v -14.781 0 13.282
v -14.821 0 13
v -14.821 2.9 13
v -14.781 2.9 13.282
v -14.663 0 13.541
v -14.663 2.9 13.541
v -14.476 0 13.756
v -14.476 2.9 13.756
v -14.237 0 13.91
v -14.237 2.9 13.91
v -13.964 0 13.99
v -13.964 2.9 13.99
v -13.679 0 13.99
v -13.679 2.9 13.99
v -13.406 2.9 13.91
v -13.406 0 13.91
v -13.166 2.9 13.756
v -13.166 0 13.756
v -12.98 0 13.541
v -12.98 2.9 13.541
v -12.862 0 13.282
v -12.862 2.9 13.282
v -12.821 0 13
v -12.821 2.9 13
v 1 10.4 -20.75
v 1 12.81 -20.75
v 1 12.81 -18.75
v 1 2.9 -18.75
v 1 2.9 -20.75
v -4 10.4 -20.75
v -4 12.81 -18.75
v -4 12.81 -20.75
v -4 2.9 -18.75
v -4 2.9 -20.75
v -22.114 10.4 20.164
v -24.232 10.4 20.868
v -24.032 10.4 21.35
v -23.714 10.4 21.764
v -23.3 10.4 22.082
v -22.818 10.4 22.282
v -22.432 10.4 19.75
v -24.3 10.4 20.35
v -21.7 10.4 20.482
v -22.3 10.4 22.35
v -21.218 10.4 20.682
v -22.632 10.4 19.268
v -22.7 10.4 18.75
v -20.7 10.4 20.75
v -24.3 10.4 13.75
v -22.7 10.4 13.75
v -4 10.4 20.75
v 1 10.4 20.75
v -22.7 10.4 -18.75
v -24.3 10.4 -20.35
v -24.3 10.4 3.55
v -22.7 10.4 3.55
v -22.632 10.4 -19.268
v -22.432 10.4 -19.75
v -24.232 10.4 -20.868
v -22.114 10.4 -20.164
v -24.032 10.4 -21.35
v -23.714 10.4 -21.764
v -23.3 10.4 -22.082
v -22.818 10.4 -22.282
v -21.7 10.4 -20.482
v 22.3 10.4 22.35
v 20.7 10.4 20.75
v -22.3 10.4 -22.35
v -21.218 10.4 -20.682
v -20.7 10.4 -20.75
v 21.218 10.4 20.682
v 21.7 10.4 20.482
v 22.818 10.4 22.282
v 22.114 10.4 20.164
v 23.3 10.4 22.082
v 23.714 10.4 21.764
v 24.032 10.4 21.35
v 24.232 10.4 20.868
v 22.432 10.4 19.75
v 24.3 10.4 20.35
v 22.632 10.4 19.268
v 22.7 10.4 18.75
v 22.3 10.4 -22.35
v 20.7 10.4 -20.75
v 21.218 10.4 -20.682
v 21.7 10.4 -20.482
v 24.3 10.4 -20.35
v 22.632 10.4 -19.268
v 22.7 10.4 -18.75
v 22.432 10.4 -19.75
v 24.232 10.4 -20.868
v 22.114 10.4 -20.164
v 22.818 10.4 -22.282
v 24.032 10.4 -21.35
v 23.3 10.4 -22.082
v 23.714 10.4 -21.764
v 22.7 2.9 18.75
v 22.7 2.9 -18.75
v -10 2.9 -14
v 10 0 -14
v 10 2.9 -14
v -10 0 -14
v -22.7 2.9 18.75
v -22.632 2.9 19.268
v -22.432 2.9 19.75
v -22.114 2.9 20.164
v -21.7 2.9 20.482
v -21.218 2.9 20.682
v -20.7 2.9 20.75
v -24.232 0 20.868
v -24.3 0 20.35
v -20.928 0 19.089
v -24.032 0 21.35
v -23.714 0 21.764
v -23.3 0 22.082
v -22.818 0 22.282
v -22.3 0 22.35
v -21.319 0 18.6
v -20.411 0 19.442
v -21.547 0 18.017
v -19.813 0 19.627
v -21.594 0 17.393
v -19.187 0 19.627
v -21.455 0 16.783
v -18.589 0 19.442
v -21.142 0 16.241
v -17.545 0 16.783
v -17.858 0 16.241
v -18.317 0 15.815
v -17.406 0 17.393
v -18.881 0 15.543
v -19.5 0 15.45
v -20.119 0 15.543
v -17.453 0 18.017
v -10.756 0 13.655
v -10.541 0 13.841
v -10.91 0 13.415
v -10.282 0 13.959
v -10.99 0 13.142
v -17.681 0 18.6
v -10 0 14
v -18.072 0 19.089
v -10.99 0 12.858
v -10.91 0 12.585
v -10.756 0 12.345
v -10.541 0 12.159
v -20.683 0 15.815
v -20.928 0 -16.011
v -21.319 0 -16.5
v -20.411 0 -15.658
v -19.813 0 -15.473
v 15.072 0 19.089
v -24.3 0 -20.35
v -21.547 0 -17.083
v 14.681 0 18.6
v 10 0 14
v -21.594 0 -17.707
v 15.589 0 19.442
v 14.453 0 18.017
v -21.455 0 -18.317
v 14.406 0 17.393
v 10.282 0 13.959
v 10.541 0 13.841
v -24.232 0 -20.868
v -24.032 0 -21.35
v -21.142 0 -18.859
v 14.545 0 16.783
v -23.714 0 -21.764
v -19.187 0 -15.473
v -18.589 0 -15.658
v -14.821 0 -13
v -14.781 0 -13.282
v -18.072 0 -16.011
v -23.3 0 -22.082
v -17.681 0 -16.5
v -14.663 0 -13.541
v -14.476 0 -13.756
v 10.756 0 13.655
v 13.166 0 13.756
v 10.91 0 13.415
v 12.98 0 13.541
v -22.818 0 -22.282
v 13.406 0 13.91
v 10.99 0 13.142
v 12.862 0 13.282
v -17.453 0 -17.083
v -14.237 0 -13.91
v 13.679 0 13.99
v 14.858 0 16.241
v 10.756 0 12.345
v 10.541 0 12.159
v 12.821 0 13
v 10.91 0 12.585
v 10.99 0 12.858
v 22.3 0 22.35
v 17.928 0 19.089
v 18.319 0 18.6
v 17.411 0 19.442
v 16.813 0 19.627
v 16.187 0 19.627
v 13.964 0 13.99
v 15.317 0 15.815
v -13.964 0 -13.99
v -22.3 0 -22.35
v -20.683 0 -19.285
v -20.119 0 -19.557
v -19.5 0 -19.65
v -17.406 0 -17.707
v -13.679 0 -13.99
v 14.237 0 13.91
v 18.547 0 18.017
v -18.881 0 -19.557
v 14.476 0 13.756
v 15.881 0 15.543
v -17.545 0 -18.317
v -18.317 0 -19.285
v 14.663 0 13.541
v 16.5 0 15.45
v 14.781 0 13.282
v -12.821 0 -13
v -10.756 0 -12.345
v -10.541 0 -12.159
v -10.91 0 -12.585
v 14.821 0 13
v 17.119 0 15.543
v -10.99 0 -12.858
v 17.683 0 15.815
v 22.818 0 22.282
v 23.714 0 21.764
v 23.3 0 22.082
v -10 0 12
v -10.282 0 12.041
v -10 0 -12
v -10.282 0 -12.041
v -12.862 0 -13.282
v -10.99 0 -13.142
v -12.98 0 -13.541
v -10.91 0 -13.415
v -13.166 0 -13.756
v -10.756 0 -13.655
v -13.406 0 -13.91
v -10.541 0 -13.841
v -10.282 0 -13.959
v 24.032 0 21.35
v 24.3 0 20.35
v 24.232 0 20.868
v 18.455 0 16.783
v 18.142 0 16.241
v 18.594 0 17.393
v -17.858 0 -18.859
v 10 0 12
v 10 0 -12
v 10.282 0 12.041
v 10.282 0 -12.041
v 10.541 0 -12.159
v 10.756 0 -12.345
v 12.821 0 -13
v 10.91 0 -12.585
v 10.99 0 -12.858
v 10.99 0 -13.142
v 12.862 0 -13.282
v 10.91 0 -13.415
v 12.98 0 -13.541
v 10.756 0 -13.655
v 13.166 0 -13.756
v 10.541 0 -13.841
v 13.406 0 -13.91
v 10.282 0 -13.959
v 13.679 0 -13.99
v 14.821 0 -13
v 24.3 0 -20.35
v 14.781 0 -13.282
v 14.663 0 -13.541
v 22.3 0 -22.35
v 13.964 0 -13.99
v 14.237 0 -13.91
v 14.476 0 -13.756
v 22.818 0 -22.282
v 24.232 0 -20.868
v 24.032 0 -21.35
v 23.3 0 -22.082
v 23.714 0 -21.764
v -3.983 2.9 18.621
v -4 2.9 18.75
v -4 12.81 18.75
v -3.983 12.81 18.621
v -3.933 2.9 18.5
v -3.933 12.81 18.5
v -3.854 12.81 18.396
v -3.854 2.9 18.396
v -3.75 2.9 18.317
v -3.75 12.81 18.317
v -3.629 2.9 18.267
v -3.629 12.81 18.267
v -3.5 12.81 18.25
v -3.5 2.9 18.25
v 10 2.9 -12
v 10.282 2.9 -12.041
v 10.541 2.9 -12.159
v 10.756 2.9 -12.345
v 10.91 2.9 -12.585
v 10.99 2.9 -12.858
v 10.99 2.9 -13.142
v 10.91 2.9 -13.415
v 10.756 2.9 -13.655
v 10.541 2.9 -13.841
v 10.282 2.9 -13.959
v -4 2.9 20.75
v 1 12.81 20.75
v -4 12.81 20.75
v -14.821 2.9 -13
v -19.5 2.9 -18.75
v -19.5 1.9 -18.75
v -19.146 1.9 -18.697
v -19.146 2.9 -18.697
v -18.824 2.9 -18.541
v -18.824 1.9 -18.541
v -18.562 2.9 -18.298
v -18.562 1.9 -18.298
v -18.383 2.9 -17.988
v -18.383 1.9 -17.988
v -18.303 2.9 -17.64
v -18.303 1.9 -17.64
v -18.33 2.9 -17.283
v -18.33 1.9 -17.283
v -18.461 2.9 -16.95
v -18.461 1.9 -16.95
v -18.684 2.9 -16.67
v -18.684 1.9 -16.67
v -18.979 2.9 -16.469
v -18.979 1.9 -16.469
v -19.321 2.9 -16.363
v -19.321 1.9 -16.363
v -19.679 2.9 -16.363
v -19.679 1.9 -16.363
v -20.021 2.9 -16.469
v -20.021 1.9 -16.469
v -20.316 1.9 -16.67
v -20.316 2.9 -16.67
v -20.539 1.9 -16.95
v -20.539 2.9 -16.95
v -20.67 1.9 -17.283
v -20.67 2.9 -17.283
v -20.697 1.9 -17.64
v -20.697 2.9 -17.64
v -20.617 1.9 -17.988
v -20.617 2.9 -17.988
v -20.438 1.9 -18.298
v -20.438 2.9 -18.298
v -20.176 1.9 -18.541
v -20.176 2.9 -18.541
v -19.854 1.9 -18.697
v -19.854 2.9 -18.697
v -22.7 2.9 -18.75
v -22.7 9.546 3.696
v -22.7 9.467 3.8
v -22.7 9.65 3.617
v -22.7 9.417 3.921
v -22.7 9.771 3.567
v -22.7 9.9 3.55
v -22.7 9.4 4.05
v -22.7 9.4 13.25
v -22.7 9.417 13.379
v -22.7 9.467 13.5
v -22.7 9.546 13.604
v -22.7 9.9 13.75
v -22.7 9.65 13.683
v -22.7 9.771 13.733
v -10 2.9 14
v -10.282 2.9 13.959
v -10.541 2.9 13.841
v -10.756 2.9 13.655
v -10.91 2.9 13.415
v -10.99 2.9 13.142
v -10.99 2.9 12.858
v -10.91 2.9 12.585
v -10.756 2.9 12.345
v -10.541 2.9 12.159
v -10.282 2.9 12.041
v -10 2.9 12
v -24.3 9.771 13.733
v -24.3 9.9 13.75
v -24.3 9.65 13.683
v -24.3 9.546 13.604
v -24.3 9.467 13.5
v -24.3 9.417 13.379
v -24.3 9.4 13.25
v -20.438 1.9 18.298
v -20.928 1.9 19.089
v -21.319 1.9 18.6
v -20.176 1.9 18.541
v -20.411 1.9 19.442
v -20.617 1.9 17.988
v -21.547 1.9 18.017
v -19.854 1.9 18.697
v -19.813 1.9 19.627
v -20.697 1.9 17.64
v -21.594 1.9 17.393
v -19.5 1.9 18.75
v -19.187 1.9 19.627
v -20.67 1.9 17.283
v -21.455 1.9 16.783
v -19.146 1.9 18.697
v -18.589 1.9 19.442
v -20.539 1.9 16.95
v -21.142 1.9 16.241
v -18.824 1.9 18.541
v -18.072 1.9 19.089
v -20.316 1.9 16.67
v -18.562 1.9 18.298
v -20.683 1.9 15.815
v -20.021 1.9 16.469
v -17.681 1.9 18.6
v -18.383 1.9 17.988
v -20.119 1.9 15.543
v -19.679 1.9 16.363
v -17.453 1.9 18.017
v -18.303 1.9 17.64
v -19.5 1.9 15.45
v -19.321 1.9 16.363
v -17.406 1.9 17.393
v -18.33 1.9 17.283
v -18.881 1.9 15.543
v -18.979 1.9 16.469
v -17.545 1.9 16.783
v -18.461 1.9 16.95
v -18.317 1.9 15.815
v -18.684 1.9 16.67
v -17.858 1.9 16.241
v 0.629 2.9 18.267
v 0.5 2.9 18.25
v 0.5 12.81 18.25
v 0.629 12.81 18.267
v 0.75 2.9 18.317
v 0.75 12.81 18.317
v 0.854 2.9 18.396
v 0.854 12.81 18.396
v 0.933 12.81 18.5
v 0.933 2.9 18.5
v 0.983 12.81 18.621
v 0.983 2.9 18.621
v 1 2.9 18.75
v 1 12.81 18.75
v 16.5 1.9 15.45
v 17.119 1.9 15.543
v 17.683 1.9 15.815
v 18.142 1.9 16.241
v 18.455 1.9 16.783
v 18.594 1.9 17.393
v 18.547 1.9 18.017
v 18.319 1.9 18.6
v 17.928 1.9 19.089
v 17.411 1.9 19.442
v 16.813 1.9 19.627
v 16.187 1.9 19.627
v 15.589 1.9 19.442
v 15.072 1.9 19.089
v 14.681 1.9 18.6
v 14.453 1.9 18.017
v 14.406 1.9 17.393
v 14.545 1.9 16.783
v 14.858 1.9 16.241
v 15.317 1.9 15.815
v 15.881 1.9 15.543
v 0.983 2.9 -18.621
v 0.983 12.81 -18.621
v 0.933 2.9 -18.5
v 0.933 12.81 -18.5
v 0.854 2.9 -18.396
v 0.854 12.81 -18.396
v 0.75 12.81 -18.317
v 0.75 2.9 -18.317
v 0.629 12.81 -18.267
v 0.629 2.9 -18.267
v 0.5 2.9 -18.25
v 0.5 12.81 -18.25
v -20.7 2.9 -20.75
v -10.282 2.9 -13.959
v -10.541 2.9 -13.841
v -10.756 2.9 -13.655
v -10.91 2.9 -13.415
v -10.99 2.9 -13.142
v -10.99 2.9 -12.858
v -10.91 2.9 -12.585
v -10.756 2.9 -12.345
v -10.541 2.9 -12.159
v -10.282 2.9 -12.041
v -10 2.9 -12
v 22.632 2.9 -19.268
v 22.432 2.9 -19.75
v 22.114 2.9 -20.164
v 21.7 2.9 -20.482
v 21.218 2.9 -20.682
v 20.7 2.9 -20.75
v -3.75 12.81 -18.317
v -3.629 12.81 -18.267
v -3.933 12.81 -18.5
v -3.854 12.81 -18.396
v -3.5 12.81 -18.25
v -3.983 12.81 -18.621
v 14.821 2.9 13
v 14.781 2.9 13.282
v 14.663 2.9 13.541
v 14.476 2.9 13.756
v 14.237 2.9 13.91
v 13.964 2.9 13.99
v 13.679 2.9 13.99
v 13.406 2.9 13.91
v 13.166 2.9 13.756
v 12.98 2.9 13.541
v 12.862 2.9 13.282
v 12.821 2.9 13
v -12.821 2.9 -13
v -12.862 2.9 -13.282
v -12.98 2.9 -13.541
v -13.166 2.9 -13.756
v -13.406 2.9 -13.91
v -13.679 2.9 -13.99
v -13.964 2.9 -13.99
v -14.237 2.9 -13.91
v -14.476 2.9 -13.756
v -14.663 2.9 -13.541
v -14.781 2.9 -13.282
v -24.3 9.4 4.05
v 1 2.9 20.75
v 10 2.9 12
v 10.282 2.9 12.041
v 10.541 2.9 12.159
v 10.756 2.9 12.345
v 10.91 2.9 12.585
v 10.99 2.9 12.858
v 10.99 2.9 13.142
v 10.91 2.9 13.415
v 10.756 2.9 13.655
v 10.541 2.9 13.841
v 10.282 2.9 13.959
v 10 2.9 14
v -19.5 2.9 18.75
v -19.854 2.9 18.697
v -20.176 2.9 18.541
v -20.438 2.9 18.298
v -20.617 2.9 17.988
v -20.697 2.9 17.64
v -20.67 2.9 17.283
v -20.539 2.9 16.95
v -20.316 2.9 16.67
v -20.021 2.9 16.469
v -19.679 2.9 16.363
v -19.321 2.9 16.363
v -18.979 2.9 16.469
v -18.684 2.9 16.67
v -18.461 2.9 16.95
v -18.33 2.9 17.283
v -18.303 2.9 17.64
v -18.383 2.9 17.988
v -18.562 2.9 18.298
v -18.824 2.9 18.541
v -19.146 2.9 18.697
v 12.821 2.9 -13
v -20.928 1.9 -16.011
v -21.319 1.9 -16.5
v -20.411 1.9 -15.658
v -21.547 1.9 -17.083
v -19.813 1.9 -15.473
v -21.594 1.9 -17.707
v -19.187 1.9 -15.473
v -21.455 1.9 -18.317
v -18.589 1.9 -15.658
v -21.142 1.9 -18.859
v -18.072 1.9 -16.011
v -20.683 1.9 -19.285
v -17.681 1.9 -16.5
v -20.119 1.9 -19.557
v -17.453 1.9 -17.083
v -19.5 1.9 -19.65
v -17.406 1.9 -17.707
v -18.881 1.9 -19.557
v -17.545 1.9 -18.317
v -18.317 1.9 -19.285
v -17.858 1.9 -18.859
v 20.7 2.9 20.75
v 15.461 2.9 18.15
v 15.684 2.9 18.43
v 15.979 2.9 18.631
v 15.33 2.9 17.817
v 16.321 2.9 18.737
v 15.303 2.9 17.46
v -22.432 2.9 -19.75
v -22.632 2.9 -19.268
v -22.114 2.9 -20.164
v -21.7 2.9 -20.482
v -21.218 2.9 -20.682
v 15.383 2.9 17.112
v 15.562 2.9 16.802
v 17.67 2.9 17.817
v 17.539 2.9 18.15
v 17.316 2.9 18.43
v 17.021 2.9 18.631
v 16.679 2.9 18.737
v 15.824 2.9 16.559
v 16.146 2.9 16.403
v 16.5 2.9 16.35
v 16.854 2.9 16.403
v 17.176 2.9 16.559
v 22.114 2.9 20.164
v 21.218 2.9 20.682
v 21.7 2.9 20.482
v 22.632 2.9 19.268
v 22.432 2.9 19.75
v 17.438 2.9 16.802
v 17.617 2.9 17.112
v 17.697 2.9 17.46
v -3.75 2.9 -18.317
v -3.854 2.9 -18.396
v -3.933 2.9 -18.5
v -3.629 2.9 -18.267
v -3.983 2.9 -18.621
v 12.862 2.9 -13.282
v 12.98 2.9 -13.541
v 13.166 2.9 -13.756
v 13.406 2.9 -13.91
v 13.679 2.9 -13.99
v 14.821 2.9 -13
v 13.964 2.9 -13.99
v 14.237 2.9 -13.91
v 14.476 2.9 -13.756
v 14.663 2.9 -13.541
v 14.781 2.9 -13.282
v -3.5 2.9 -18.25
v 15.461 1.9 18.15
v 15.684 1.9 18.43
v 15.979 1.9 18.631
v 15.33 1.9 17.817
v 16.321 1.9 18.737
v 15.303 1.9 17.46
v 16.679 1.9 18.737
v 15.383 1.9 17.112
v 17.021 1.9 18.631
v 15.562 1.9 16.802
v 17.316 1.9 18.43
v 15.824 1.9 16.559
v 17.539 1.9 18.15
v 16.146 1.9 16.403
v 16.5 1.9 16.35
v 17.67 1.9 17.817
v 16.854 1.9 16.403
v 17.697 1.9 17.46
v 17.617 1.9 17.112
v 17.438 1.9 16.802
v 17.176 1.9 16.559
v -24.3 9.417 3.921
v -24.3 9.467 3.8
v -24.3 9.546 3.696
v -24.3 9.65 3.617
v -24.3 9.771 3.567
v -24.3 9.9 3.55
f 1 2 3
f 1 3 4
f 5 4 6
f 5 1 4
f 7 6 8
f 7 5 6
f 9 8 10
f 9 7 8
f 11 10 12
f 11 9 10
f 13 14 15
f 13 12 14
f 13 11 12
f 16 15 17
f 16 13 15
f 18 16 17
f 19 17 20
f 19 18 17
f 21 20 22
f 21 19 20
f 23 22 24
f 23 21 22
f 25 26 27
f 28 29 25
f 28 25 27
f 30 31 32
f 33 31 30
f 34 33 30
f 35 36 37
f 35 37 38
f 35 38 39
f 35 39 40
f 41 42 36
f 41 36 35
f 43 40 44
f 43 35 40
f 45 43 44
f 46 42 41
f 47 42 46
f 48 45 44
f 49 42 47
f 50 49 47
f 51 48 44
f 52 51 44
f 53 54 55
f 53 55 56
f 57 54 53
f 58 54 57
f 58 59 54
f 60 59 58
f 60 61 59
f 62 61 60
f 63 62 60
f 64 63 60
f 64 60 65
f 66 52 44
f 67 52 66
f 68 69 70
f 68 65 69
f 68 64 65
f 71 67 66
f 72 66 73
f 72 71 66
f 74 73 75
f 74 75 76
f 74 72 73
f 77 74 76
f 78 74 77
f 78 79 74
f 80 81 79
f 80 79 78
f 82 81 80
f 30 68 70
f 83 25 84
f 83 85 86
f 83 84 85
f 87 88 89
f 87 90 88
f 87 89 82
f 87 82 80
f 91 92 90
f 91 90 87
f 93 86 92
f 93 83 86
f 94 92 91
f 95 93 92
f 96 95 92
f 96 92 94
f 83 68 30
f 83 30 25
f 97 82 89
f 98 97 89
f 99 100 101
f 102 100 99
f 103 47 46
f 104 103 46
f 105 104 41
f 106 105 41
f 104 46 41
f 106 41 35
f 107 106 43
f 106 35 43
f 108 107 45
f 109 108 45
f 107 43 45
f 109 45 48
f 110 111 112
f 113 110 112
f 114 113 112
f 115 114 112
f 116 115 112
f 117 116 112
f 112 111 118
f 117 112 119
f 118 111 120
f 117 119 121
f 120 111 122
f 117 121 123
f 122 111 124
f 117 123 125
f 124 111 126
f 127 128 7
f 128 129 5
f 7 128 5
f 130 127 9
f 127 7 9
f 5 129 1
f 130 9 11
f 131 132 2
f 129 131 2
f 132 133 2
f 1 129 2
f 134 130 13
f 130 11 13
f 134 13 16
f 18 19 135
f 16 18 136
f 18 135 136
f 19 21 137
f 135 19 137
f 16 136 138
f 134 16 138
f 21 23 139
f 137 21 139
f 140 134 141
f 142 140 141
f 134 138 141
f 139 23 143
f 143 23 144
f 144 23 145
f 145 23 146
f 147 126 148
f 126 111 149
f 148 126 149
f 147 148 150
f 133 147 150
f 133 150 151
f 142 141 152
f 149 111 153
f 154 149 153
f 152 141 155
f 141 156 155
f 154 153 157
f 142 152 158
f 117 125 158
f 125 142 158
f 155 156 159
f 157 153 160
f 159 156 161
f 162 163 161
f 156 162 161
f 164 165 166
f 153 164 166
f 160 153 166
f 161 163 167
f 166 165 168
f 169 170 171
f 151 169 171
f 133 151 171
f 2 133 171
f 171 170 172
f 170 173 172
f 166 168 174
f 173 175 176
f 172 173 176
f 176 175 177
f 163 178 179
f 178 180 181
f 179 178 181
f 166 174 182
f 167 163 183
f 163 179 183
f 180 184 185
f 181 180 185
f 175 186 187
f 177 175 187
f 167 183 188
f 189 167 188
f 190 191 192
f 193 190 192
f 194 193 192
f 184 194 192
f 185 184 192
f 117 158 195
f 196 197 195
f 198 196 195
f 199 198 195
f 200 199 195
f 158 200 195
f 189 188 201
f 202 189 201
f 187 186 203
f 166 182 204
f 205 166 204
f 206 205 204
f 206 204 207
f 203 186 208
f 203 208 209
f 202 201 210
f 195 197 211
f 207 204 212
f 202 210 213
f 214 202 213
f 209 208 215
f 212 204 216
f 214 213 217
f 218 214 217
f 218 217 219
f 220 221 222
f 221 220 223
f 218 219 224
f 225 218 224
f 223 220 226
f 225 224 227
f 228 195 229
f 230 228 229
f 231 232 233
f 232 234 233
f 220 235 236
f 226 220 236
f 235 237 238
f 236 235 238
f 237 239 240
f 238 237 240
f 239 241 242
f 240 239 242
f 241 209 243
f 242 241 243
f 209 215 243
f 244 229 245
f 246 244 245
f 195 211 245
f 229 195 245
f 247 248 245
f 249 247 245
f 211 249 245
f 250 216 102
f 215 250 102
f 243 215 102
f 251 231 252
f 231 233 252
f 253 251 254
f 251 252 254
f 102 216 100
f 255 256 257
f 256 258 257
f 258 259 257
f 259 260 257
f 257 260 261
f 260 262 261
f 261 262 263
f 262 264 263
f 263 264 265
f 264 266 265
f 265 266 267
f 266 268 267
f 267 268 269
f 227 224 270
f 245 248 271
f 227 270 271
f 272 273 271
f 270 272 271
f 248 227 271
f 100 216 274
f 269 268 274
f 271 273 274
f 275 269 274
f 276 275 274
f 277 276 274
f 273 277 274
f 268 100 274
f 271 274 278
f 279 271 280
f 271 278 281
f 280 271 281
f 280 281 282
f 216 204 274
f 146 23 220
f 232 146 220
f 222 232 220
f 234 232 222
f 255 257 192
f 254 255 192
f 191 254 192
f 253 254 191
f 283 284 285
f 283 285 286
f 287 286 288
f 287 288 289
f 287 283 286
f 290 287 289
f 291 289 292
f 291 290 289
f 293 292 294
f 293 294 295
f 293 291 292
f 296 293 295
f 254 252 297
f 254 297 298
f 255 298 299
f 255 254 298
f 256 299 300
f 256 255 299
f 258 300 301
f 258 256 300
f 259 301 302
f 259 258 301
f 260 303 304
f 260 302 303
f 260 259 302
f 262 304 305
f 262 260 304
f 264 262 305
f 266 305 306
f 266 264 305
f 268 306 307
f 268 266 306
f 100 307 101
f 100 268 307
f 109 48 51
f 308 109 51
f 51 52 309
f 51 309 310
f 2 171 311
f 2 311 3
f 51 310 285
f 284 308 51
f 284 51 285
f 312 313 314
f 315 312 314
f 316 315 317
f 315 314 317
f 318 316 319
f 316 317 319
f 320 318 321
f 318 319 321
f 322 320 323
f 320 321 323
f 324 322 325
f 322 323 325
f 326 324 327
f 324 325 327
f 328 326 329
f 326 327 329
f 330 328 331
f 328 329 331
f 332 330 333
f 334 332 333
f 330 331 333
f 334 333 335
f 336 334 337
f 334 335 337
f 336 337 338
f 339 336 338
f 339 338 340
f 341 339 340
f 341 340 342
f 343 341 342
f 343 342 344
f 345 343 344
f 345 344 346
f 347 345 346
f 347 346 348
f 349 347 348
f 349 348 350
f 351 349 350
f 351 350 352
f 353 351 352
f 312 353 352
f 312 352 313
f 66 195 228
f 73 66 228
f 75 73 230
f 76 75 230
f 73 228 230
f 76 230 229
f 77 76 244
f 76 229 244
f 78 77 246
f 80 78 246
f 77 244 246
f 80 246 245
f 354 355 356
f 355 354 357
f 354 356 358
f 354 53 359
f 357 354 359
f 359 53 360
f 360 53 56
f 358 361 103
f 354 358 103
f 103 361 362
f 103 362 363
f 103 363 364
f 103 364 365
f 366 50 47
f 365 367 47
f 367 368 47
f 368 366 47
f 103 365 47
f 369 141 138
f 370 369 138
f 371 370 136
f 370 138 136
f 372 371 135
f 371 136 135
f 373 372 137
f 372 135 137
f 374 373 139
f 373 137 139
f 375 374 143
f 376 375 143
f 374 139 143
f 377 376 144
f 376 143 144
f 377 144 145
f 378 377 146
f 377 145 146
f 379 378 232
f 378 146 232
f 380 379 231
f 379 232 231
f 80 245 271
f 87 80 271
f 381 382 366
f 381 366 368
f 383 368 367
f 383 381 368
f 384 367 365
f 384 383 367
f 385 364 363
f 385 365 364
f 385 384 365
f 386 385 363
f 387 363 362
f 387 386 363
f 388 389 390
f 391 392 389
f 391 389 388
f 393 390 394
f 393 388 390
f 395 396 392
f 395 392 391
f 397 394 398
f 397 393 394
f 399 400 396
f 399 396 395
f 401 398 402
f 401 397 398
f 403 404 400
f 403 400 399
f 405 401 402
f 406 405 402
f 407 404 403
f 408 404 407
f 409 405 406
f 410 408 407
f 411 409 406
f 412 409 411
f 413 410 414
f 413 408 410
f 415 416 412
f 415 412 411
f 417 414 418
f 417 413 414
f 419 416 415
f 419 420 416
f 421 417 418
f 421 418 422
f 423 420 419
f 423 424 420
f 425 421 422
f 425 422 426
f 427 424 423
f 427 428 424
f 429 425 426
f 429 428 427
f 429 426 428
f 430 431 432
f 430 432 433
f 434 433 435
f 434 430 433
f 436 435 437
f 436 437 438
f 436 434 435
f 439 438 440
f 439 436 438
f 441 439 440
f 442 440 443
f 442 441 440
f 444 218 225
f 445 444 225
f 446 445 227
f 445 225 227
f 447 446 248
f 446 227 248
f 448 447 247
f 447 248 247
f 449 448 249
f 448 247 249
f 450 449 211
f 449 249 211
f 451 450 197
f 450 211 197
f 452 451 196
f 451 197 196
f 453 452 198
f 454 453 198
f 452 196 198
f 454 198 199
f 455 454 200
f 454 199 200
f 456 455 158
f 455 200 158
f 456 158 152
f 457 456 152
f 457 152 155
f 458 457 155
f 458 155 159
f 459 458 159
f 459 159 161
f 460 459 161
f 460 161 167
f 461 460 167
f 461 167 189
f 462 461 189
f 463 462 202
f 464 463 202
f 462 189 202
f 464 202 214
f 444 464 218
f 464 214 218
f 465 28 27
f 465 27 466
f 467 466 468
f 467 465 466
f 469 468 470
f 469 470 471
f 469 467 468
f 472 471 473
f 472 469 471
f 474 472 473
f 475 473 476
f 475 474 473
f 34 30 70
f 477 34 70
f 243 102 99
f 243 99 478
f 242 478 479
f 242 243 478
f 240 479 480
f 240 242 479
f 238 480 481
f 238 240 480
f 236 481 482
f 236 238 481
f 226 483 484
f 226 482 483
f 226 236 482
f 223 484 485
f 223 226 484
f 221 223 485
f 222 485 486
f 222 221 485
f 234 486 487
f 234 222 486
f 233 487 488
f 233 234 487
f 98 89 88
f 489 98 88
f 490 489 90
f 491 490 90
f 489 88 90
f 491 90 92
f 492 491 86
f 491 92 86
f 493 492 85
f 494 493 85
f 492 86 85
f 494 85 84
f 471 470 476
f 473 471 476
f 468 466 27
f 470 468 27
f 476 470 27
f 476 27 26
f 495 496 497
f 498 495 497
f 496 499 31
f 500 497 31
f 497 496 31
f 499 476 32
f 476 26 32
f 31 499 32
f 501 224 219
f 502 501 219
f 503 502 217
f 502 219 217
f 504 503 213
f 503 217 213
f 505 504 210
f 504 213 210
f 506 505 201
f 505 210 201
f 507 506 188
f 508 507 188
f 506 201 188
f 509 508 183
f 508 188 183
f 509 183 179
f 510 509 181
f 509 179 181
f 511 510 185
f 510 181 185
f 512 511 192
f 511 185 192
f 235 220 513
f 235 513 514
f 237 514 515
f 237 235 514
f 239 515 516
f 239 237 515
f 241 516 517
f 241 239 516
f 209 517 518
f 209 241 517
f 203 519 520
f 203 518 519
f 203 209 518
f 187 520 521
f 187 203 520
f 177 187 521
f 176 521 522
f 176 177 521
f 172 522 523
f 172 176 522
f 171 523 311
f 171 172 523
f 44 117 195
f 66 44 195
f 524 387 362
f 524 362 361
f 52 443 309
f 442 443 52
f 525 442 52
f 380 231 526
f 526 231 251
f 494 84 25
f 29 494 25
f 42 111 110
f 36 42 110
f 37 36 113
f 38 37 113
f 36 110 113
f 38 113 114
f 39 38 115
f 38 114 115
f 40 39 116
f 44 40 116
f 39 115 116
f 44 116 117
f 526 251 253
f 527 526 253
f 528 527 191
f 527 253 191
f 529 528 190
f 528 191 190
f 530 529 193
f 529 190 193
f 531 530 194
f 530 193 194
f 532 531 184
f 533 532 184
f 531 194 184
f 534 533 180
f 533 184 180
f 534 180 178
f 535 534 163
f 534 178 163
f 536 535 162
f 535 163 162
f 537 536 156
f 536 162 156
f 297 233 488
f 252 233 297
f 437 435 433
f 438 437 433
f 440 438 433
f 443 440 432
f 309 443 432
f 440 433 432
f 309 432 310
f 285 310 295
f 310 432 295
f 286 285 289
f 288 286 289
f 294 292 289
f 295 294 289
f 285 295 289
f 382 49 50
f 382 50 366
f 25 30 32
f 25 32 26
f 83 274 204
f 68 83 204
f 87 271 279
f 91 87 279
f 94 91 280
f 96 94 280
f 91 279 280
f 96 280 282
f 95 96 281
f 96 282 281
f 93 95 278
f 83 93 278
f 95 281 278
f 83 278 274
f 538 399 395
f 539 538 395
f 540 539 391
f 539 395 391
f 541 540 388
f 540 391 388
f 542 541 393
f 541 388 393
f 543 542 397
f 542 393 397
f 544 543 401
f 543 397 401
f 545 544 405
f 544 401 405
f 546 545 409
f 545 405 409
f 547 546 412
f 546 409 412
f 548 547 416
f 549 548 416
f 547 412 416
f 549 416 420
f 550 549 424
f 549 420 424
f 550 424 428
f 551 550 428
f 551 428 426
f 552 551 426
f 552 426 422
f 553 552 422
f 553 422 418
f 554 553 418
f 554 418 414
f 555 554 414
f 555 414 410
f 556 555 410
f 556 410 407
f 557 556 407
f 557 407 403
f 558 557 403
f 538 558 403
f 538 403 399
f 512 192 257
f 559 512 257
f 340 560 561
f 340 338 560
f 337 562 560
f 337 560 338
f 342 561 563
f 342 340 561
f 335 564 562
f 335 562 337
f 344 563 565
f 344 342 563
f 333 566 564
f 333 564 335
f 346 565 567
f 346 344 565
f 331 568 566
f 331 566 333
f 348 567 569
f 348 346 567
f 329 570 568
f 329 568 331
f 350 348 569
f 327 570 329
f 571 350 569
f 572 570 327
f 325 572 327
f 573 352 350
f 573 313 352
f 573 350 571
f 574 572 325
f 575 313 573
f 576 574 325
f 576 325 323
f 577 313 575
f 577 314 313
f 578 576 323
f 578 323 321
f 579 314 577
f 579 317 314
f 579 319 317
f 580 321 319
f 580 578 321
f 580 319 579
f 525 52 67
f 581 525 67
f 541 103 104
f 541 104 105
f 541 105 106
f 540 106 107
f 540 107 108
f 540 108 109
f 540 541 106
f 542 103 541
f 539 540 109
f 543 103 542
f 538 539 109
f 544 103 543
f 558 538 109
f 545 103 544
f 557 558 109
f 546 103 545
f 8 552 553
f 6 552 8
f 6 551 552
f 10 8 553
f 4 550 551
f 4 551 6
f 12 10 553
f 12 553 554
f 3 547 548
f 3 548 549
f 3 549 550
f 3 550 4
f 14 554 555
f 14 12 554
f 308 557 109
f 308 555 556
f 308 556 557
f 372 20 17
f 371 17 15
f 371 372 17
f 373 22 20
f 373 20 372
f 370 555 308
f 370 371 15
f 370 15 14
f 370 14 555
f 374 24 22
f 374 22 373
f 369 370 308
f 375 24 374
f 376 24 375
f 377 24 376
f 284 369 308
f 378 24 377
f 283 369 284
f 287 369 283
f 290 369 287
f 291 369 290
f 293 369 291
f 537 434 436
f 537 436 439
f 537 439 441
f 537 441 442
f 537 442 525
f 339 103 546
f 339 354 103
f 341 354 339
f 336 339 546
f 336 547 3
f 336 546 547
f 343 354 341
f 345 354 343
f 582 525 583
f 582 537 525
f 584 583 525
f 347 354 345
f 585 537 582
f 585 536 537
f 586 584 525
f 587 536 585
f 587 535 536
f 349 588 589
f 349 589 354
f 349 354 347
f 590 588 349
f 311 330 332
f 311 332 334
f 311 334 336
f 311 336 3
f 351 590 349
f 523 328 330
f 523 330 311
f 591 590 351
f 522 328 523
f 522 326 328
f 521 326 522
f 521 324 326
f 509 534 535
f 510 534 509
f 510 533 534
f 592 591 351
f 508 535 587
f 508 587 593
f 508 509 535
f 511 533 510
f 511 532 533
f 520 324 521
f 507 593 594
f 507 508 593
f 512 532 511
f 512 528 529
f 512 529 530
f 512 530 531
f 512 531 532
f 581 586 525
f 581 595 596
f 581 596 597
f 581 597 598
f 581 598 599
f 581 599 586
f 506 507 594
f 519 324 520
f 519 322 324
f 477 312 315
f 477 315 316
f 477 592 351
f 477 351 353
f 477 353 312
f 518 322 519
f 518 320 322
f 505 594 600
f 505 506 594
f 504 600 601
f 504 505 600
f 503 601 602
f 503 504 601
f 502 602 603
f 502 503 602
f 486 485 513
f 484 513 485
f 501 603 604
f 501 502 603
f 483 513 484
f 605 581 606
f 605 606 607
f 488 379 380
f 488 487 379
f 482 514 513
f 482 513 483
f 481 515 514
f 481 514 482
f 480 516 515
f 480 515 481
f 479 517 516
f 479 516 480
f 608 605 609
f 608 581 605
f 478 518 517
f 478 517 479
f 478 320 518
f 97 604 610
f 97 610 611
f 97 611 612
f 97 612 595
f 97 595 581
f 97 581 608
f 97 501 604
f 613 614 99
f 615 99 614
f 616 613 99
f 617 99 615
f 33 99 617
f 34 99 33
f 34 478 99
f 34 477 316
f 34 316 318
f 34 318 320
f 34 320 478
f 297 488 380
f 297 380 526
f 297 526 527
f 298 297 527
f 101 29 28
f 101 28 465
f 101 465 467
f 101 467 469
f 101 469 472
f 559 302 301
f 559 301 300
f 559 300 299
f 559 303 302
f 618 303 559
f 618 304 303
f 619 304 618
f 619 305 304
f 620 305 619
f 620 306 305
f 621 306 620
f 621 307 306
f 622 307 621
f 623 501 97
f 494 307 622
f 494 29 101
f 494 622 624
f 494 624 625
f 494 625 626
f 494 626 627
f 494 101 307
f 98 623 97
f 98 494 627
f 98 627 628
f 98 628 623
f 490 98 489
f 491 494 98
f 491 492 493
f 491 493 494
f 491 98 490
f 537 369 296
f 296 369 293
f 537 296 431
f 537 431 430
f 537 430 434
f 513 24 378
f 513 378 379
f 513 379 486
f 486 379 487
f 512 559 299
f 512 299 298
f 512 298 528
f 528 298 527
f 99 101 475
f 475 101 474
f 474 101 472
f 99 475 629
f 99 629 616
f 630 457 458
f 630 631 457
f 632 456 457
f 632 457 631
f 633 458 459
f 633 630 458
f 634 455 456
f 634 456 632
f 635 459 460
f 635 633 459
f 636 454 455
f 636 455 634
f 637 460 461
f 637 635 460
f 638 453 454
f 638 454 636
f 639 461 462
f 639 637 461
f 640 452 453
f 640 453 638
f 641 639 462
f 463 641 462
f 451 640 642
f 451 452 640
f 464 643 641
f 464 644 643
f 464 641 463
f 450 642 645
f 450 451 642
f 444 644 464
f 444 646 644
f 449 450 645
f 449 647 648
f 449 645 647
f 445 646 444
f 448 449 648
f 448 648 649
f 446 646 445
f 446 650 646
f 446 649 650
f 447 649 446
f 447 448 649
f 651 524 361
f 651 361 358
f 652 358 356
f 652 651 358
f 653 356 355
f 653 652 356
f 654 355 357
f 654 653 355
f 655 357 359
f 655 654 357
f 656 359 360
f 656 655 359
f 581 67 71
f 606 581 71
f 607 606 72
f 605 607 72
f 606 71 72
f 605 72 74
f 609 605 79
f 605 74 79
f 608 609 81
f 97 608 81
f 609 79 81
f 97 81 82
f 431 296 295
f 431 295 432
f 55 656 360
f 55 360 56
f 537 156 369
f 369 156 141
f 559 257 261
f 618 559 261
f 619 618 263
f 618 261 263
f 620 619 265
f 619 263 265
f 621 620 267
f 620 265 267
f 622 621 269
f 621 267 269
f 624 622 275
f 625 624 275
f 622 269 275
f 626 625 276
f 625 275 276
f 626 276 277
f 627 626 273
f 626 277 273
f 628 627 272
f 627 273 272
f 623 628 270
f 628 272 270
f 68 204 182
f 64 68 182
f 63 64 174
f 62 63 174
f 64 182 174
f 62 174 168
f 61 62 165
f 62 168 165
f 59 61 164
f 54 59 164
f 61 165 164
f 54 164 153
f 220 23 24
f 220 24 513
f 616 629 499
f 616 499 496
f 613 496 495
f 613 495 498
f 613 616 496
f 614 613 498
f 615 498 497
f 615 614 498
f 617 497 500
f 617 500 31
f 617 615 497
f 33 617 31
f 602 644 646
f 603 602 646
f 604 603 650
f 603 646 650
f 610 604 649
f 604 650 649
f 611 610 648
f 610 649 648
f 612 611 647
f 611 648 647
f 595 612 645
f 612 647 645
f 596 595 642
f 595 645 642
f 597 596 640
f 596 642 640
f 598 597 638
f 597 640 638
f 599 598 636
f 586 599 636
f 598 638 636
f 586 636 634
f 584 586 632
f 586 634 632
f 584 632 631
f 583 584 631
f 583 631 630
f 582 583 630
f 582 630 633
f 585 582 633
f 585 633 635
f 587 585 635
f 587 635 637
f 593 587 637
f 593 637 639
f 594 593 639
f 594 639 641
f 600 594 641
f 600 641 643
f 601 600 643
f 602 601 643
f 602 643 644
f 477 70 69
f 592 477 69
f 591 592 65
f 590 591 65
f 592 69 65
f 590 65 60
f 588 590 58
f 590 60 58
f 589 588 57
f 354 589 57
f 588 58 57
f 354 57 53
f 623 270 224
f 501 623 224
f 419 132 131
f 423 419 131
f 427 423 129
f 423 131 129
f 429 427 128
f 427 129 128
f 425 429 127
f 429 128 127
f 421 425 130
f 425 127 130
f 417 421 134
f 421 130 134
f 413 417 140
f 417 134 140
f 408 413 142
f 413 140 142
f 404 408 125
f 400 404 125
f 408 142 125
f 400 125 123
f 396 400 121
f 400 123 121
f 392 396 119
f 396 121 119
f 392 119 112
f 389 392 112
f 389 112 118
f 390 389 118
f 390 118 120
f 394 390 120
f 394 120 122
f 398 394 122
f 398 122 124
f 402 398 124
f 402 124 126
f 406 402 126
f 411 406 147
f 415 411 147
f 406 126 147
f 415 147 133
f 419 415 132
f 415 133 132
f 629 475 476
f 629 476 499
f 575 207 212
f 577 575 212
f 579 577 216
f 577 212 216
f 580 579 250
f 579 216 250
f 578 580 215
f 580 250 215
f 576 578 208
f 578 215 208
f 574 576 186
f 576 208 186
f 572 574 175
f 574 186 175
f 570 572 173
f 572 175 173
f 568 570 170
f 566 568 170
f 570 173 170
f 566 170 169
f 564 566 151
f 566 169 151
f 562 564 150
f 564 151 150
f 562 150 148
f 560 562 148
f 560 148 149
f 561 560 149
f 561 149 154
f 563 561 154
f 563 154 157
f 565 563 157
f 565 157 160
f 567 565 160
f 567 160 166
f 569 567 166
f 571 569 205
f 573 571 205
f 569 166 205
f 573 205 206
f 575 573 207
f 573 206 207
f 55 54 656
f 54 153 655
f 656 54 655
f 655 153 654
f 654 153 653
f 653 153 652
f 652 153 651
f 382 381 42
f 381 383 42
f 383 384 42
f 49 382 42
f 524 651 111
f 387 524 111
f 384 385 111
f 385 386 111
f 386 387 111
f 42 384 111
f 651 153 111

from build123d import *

# Parameters (mm, degrees)
EXTRUDE_1_DEPTH     = 10.4
CUT_EXTRUDE_1_DEPTH = 7.5
SKETCH_3_R          = 2.1
CUT_EXTRUDE_2_DEPTH = 1.9
SKETCH_4_R          = 1.2
CUT_EXTRUDE_3_DEPTH = 3.2
EXTRUDE_2_DEPTH     = 9.91
CUT_EXTRUDE_4_DEPTH = 10
CUT_EXTRUDE_5_DEPTH = 10


with BuildPart() as part:
    # 草图1 → 凸台-拉伸1 (new body)
    with BuildSketch(Plane(origin=(0, 0, 0), x_dir=(1, 0, 0), z_dir=(0, 1, 0))):
        with BuildLine():
            Line((-22.3, -22.35), (22.3, -22.35))
            ThreePointArc((22.3, -22.35), (23.714213562, -21.764213562), (24.3, -20.35))
            Line((24.3, -20.35), (24.3, 20.35))
            ThreePointArc((24.3, 20.35), (23.714213562, 21.764213562), (22.3, 22.35))
            Line((22.3, 22.35), (-22.3, 22.35))
            ThreePointArc((-22.3, 22.35), (-23.714213562, 21.764213562), (-24.3, 20.35))
            Line((-24.3, 20.35), (-24.3, -20.35))
            ThreePointArc((-24.3, -20.35), (-23.714213562, -21.764213562), (-22.3, -22.35))
        make_face()
    extrude(amount=EXTRUDE_1_DEPTH)

    # 草图2 → 切除-拉伸1 (cut)
    with BuildSketch(Plane(origin=(0, 10.4, 0), x_dir=(1, 0, 0), z_dir=(0, 1, 0))):
        with BuildLine():
            Line((-20.7, -20.75), (20.7, -20.75))
            ThreePointArc((20.7, -20.75), (22.114213562, -20.164213562), (22.7, -18.75))
            Line((22.7, -18.75), (22.7, 18.75))
            ThreePointArc((22.7, 18.75), (22.114213562, 20.164213562), (20.7, 20.75))
            Line((20.7, 20.75), (-20.7, 20.75))
            ThreePointArc((-20.7, 20.75), (-22.114213562, 20.164213562), (-22.7, 18.75))
            Line((-22.7, 18.75), (-22.7, -18.75))
            ThreePointArc((-22.7, -18.75), (-22.114213562, -20.164213562), (-20.7, -20.75))
        make_face()
    extrude(amount=-CUT_EXTRUDE_1_DEPTH, mode=Mode.SUBTRACT)

    # 草图3 → 切除-拉伸2 (cut)
    with BuildSketch(Plane.XZ):
        with Locations(Location((-19.5, -17.55, 0), (0, 0, 270))):
            Circle(SKETCH_3_R)
        with Locations(Location((-19.5, 17.55, 0), (0, 0, 270))):
            Circle(SKETCH_3_R)
        with Locations(Location((16.5, 17.55, 0), (0, 0, 270))):
            Circle(SKETCH_3_R)
    extrude(amount=-CUT_EXTRUDE_2_DEPTH, mode=Mode.SUBTRACT)

    # 草图4 → 切除-拉伸3 (cut)
    with BuildSketch(Plane.XZ):
        with Locations(Location((-19.5, 17.55, 0), (0, 0, 90))):
            Circle(SKETCH_4_R)
        with Locations(Location((-19.5, -17.55, 0), (0, 0, 270))):
            Circle(SKETCH_4_R)
        with Locations(Location((16.5, 17.55, 0), (0, 0, 270))):
            Circle(SKETCH_4_R)
    extrude(amount=-CUT_EXTRUDE_3_DEPTH, mode=Mode.SUBTRACT)

    # 草图5 → 凸台-拉伸2 (add)
    with BuildSketch(Plane(origin=(0, 2.9, 0), x_dir=(1, 0, 0), z_dir=(0, 1, 0))):
        with BuildLine():
            Line((-4, 20.75), (1, 20.75))
            Line((1, 20.75), (1, 18.75))
            ThreePointArc((1, 18.75), (0.853553391, 18.396446609), (0.5, 18.25))
            Line((0.5, 18.25), (-3.5, 18.25))
            ThreePointArc((-3.5, 18.25), (-3.853553391, 18.396446609), (-4, 18.75))
            Line((-4, 18.75), (-4, 20.75))
        make_face()
        with BuildLine():
            Line((-3.5, -18.25), (0.5, -18.25))
            ThreePointArc((0.5, -18.25), (0.853553391, -18.396446609), (1, -18.75))
            Line((1, -18.75), (1, -20.75))
            Line((1, -20.75), (-4, -20.75))
            Line((-4, -20.75), (-4, -18.75))
            ThreePointArc((-4, -18.75), (-3.853553391, -18.396446609), (-3.5, -18.25))
        make_face()
    extrude(amount=EXTRUDE_2_DEPTH)

    # 草图6 → 切除-拉伸4 (cut)
    with BuildSketch(Plane.XZ):
        with BuildLine():
            Line((-12.821321535, 13), (-12.821321535, -13))
            ThreePointArc((-12.821321535, -13), (-13.821321535, -14), (-14.821321535, -13))
            Line((-14.821321535, -13), (-14.821321535, 13))
            ThreePointArc((-14.821321535, 13), (-13.821321535, 14), (-12.821321535, 13))
        make_face()
        with BuildLine():
            Line((-10, -12), (10, -12))
            ThreePointArc((10, -12), (11, -13), (10, -14))
            Line((10, -14), (-10, -14))
            ThreePointArc((-10, -14), (-11, -13), (-10, -12))
        make_face()
        with BuildLine():
            Line((12.821321535, 13), (12.821321535, -13))
            ThreePointArc((12.821321535, -13), (13.821321535, -14), (14.821321535, -13))
            Line((14.821321535, -13), (14.821321535, 13))
            ThreePointArc((14.821321535, 13), (13.821321535, 14), (12.821321535, 13))
        make_face()
        with BuildLine():
            Line((-10, 12), (10, 12))
            ThreePointArc((10, 12), (11, 13), (10, 14))
            Line((10, 14), (-10, 14))
            ThreePointArc((-10, 14), (-11, 13), (-10, 12))
        make_face()
    extrude(amount=-CUT_EXTRUDE_4_DEPTH, mode=Mode.SUBTRACT)

    # 草图7 → 切除-拉伸5 (cut)
    with BuildSketch(Plane.ZY.offset(24.3)):
        with BuildLine():
            Line((3.55, 10.4), (13.75, 10.4))
            Line((13.75, 10.4), (13.75, 9.9))
            ThreePointArc((13.75, 9.9), (13.603553391, 9.546446609), (13.25, 9.4))
            Line((13.25, 9.4), (4.05, 9.4))
            ThreePointArc((4.05, 9.4), (3.696446609, 9.546446609), (3.55, 9.9))
            Line((3.55, 9.9), (3.55, 10.4))
        make_face()
    extrude(amount=-CUT_EXTRUDE_5_DEPTH, mode=Mode.SUBTRACT)


solid = part.part
